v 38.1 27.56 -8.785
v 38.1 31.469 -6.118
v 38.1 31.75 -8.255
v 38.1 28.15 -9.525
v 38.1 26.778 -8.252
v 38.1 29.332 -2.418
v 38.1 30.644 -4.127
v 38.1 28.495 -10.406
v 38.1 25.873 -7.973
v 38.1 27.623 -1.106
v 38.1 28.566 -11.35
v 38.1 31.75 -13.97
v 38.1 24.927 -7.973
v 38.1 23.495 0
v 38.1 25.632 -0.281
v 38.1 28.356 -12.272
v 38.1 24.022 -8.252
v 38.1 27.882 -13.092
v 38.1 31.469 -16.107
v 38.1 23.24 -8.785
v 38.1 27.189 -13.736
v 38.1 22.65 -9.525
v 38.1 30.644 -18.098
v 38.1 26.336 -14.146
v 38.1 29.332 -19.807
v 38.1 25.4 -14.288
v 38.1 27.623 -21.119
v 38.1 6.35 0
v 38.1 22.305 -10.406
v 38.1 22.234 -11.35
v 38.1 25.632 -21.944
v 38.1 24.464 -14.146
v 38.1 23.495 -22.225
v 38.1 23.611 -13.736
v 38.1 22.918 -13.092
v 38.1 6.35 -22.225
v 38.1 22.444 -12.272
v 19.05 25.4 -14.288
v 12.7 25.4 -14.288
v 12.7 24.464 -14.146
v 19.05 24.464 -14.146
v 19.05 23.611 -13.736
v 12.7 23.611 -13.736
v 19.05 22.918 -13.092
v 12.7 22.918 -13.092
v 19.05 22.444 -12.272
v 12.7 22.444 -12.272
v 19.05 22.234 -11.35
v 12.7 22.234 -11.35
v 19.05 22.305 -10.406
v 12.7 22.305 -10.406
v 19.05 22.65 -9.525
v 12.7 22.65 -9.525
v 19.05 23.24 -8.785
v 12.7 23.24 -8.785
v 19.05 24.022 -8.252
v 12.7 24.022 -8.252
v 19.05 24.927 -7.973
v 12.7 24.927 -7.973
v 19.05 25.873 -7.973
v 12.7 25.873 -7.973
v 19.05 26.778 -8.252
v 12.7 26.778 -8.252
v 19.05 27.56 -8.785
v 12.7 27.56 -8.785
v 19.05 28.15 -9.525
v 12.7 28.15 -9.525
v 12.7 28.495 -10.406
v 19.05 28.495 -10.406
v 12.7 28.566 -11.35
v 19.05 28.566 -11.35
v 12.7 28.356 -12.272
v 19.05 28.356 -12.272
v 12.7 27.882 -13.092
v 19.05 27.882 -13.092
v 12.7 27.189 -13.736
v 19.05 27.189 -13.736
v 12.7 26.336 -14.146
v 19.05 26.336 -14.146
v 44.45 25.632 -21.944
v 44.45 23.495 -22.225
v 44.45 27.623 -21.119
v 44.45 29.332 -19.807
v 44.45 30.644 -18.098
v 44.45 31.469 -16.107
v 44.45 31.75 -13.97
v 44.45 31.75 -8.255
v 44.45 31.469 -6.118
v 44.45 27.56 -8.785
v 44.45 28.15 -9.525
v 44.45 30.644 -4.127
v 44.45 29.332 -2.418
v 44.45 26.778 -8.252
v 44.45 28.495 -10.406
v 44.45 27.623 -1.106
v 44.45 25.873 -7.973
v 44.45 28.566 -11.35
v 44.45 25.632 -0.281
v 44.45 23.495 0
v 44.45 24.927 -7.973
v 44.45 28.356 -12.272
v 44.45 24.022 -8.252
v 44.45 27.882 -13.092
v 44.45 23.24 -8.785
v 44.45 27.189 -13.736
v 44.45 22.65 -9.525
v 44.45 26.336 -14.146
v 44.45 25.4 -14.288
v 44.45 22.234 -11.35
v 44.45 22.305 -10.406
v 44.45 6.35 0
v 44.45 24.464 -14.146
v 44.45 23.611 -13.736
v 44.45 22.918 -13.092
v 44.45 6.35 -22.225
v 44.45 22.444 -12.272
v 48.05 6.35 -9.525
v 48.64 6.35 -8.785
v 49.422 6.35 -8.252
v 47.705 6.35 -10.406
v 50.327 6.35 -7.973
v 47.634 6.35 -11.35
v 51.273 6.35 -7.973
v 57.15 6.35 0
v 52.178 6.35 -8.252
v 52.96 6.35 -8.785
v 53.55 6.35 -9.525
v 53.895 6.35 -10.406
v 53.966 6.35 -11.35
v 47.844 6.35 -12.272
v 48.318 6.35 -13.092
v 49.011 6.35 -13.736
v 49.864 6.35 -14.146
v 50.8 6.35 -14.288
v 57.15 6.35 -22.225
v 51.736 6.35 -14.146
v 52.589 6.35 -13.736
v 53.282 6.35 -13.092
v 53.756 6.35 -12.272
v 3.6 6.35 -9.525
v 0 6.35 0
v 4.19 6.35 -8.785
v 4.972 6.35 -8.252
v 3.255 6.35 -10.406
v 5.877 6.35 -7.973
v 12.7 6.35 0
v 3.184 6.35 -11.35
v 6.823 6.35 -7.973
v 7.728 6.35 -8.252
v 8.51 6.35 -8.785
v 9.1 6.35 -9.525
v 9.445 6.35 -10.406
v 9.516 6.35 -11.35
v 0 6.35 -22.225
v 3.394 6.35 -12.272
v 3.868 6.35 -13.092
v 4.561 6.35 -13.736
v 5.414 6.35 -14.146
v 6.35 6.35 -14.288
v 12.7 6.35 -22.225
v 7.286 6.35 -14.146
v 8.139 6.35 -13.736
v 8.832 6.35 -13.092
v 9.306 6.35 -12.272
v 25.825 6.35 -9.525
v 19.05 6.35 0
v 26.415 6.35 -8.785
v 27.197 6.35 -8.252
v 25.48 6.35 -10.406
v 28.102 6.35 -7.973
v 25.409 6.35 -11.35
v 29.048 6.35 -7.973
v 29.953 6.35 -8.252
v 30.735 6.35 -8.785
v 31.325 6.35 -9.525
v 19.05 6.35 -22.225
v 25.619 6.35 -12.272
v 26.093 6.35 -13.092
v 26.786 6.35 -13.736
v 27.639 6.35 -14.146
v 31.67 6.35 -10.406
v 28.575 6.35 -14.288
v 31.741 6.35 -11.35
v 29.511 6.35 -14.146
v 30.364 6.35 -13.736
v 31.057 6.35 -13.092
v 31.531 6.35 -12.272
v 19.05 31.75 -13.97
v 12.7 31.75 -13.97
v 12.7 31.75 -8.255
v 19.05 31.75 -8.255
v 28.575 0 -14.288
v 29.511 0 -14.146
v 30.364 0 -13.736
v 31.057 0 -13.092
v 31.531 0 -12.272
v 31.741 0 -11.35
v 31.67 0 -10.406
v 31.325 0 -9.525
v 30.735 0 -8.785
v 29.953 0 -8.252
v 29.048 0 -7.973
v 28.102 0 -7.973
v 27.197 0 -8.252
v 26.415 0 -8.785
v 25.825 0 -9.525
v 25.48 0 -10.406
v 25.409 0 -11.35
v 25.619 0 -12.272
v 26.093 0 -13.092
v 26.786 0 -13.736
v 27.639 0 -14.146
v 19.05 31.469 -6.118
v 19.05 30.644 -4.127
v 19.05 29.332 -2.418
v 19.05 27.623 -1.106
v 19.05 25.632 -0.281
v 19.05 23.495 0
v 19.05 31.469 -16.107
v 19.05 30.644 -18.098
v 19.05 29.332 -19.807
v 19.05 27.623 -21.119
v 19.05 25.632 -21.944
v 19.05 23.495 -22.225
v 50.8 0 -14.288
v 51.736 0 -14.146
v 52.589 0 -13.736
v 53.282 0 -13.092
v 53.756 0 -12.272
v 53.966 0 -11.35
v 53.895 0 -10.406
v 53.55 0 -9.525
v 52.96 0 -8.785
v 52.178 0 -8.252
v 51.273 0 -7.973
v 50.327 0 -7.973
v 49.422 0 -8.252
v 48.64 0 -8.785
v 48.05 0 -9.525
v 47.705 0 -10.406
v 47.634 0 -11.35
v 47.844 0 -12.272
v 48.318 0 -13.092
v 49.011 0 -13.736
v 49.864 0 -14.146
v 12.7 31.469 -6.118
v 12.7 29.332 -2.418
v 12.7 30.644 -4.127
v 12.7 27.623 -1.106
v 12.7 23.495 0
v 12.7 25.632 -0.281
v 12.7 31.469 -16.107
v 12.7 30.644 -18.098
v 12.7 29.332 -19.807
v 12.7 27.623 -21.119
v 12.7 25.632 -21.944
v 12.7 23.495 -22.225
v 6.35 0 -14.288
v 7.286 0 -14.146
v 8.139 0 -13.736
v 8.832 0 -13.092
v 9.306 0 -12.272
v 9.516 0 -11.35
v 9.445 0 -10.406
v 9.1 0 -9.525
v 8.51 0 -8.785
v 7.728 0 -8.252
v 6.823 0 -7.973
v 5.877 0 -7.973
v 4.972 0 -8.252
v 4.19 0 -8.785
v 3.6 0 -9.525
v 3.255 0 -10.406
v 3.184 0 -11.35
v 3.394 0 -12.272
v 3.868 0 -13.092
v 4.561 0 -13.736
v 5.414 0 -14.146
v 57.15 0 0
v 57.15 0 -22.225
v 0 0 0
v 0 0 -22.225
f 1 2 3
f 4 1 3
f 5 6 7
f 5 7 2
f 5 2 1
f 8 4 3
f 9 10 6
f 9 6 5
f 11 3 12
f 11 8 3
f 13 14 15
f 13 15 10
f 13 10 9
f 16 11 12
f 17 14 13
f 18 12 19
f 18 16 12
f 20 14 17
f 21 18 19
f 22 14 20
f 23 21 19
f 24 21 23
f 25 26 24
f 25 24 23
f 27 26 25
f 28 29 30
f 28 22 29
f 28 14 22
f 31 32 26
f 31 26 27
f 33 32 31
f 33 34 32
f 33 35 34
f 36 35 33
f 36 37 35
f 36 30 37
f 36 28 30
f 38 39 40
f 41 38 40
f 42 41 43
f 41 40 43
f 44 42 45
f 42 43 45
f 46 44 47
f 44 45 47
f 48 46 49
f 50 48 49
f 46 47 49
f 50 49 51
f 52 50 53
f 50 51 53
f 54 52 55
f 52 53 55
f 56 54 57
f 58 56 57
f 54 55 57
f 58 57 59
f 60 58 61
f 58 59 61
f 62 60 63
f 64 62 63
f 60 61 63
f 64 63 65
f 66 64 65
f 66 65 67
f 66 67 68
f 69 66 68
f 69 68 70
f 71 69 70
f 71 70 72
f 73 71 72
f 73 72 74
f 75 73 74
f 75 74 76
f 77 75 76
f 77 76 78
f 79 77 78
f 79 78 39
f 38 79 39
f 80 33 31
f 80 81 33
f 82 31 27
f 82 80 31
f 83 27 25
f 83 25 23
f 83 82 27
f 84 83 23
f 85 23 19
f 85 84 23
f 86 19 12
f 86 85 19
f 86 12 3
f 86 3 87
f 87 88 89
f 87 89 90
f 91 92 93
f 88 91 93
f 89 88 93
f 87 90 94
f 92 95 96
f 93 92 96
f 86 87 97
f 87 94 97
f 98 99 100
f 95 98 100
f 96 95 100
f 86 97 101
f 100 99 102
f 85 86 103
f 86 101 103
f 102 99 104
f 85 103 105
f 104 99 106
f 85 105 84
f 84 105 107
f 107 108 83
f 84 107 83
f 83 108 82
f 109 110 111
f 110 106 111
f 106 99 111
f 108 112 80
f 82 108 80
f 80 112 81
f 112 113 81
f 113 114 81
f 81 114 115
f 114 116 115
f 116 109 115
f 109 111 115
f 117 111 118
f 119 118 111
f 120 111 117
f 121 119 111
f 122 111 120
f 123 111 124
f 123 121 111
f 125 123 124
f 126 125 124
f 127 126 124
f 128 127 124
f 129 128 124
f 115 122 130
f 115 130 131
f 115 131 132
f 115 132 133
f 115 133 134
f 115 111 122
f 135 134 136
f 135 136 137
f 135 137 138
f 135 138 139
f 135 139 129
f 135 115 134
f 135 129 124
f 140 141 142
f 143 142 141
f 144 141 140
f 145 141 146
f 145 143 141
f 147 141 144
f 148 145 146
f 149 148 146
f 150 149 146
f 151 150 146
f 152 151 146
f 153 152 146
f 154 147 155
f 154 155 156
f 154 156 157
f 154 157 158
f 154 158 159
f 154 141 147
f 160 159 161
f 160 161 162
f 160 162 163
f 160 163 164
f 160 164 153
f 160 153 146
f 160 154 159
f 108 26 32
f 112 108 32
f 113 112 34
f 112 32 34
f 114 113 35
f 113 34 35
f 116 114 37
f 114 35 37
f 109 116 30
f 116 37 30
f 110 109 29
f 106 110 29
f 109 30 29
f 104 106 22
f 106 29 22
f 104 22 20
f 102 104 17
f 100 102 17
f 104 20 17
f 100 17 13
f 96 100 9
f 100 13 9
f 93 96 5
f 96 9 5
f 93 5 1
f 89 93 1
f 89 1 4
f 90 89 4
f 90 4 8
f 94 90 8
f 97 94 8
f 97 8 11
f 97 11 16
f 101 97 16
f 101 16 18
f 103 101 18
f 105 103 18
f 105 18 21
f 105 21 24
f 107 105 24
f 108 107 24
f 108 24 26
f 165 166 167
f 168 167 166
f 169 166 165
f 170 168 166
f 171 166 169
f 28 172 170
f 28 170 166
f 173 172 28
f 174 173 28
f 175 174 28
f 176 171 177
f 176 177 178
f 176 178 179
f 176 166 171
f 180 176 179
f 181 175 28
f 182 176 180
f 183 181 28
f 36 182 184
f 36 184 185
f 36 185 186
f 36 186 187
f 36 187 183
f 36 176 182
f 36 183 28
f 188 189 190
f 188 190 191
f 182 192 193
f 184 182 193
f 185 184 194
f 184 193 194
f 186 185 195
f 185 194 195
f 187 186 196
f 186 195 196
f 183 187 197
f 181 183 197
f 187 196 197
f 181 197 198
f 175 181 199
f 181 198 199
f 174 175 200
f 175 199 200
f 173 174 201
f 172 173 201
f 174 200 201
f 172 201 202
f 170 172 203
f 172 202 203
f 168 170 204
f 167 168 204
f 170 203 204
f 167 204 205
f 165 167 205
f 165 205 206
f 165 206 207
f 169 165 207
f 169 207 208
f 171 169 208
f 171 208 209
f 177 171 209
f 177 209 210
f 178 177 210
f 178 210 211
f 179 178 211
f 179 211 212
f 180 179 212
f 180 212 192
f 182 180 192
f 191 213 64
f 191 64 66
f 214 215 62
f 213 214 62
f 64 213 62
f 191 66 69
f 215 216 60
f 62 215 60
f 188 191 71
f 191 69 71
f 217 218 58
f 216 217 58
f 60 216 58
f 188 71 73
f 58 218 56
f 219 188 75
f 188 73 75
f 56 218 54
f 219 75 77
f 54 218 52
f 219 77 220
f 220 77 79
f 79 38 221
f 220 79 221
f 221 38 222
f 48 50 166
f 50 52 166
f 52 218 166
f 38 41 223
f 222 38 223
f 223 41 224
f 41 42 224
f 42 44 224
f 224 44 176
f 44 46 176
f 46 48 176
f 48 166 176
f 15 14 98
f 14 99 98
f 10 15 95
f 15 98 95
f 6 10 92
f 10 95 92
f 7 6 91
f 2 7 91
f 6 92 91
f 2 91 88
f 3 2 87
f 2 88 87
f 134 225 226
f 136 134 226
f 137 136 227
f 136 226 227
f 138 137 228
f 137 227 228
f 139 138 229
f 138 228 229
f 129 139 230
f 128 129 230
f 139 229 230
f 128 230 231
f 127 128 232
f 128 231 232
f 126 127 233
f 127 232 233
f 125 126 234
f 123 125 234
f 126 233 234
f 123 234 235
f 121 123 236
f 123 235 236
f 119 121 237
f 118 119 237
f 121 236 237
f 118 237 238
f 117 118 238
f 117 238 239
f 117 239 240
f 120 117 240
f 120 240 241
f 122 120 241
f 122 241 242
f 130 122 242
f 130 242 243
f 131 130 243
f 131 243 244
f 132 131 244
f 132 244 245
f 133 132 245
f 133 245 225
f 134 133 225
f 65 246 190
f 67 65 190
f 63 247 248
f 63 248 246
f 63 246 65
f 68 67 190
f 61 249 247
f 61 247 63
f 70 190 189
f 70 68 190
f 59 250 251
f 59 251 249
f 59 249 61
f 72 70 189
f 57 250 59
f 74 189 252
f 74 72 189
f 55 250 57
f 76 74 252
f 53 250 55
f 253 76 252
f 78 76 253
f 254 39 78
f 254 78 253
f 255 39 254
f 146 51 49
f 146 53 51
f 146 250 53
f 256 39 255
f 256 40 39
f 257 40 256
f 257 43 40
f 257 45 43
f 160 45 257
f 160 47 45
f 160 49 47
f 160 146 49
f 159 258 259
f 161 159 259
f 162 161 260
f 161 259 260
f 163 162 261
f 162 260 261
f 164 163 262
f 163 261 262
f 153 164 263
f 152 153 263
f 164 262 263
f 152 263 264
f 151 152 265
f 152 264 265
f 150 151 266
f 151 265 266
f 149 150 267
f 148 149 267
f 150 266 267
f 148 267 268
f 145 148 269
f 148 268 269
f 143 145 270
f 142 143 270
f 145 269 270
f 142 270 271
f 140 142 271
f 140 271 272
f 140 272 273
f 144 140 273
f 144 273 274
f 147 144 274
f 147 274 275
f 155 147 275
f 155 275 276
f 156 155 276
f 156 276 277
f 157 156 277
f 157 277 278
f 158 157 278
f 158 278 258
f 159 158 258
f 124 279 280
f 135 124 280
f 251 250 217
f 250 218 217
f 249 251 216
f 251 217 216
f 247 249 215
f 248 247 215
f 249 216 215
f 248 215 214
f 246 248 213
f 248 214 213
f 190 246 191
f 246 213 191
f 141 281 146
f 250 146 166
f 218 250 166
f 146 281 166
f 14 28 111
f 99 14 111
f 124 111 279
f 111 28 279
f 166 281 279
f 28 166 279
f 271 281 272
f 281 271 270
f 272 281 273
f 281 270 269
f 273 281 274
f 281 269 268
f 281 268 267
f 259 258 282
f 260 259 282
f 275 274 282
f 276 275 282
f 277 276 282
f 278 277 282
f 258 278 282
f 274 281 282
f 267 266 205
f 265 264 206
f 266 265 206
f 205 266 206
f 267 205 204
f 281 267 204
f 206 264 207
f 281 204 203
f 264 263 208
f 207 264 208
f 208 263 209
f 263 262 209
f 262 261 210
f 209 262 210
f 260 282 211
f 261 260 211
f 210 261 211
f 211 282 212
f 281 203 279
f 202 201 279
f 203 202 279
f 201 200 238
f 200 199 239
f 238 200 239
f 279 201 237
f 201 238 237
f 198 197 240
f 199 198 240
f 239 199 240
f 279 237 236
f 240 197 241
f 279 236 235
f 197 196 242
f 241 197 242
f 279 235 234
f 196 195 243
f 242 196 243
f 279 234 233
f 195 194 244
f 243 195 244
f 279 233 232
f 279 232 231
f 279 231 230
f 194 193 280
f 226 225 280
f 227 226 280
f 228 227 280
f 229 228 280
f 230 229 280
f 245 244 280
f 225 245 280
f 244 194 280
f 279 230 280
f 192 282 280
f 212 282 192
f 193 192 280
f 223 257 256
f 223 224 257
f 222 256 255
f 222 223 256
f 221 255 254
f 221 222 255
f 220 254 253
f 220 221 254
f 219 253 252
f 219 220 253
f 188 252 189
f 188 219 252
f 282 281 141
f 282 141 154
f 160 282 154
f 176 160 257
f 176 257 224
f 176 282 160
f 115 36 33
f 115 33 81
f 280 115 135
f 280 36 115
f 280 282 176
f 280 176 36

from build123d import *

# Parameters (mm, degrees)
SKETCH2_W                       = 12.7
SKETCH2_H                       = 22.225
BOSS_EXTRUDE1_DEPTH             = 6.35
SKETCH2_W_2                     = 19.05
BOSS_EXTRUDE1_2_DEPTH           = 6.35
BOSS_EXTRUDE1_3_DEPTH           = 6.35
SKETCH2_3_W                     = 6.35
SKETCH2_3_H                     = 22.225
BOSS_EXTRUDE2_DEPTH             = 31.75
SKETCH3_R                       = 3.175
CUT_EXTRUDE1_DEPTH              = 59.973007597
F_1_4_0_25_DIAMETER_HOLE1_D     = 6.35
F_1_4_0_25_DIAMETER_HOLE1_DEPTH = 25.4
F_1_4_0_25_DIAMETER_HOLE1_TIP   = 1.907732465
FILLET1_R                       = 8.255


with BuildPart() as part:
    # Sketch2 → Boss-Extrude1 (new body)
    with BuildSketch(Plane(origin=(0, 0, 0), x_dir=(1, 0, 0), z_dir=(0, 1, 0))):
        with Locations((6.35, 11.1125)):
            Rectangle(SKETCH2_W, SKETCH2_H)
    extrude(amount=BOSS_EXTRUDE1_DEPTH)



with BuildPart() as body_2:
    # Sketch2 → Boss-Extrude1 2 (new body)
    with BuildSketch(Plane(origin=(0, 0, 0), x_dir=(1, 0, 0), z_dir=(0, 1, 0))):
        with Locations((28.575, 11.1125)):
            Rectangle(SKETCH2_W_2, SKETCH2_H)
    extrude(amount=BOSS_EXTRUDE1_2_DEPTH)


with BuildPart() as body_3:
    # Sketch2 → Boss-Extrude1 3 (new body)
    with BuildSketch(Plane(origin=(0, 0, 0), x_dir=(1, 0, 0), z_dir=(0, 1, 0))):
        with Locations((50.8, 11.1125)):
            Rectangle(SKETCH2_W, SKETCH2_H)
    extrude(amount=BOSS_EXTRUDE1_3_DEPTH)


with BuildPart() as part_1:
    add(part.part)

    add(body_2.part)  # Boss-Extrude2 merges body 2

    add(body_3.part)  # Boss-Extrude2 merges body 3
    # Sketch2<3> → Boss-Extrude2 (add)
    with BuildSketch(Plane(origin=(0, 0, 0), x_dir=(1, 0, 0), z_dir=(0, 1, 0))):
        with Locations((15.875, 11.1125)):
            Rectangle(SKETCH2_3_W, SKETCH2_3_H)
        with Locations((41.275, 11.1125)):
            Rectangle(SKETCH2_3_W, SKETCH2_3_H)
    extrude(amount=BOSS_EXTRUDE2_DEPTH)

    # Sketch3 → Cut-Extrude1 (cut, through all)
    with BuildSketch(Plane.ZY.offset(-12.7)):
        with Locations((-11.1125, 25.4)):
            Circle(SKETCH3_R)
    extrude(amount=-CUT_EXTRUDE1_DEPTH, mode=Mode.SUBTRACT)

    # 1/4 (0.25) Diameter Hole1
    with Locations(Plane(origin=(6.35, 6.35, -11.1125), x_dir=(0, 0, 1), z_dir=(0, 1, 0))):
        with Locations((0, 0), (0, 22.225), (0, 44.45)):
            Hole(F_1_4_0_25_DIAMETER_HOLE1_D / 2, depth=F_1_4_0_25_DIAMETER_HOLE1_DEPTH)
            with Locations((0, 0, -(F_1_4_0_25_DIAMETER_HOLE1_DEPTH + F_1_4_0_25_DIAMETER_HOLE1_TIP / 2))):  # 118° drill point
                Cone(0, F_1_4_0_25_DIAMETER_HOLE1_D / 2, F_1_4_0_25_DIAMETER_HOLE1_TIP, mode=Mode.SUBTRACT)

    # Fillet1
    fillet1_edges = [part_1.edges().sort_by_distance(p)[0] for p in [
        (15.875, 31.75, -22.225),
        (41.275, 31.75, -22.225),
        (41.275, 31.75, 0),
        (15.875, 31.75, 0),
    ]]
    fillet(fillet1_edges, radius=FILLET1_R)


solid = part_1.part
